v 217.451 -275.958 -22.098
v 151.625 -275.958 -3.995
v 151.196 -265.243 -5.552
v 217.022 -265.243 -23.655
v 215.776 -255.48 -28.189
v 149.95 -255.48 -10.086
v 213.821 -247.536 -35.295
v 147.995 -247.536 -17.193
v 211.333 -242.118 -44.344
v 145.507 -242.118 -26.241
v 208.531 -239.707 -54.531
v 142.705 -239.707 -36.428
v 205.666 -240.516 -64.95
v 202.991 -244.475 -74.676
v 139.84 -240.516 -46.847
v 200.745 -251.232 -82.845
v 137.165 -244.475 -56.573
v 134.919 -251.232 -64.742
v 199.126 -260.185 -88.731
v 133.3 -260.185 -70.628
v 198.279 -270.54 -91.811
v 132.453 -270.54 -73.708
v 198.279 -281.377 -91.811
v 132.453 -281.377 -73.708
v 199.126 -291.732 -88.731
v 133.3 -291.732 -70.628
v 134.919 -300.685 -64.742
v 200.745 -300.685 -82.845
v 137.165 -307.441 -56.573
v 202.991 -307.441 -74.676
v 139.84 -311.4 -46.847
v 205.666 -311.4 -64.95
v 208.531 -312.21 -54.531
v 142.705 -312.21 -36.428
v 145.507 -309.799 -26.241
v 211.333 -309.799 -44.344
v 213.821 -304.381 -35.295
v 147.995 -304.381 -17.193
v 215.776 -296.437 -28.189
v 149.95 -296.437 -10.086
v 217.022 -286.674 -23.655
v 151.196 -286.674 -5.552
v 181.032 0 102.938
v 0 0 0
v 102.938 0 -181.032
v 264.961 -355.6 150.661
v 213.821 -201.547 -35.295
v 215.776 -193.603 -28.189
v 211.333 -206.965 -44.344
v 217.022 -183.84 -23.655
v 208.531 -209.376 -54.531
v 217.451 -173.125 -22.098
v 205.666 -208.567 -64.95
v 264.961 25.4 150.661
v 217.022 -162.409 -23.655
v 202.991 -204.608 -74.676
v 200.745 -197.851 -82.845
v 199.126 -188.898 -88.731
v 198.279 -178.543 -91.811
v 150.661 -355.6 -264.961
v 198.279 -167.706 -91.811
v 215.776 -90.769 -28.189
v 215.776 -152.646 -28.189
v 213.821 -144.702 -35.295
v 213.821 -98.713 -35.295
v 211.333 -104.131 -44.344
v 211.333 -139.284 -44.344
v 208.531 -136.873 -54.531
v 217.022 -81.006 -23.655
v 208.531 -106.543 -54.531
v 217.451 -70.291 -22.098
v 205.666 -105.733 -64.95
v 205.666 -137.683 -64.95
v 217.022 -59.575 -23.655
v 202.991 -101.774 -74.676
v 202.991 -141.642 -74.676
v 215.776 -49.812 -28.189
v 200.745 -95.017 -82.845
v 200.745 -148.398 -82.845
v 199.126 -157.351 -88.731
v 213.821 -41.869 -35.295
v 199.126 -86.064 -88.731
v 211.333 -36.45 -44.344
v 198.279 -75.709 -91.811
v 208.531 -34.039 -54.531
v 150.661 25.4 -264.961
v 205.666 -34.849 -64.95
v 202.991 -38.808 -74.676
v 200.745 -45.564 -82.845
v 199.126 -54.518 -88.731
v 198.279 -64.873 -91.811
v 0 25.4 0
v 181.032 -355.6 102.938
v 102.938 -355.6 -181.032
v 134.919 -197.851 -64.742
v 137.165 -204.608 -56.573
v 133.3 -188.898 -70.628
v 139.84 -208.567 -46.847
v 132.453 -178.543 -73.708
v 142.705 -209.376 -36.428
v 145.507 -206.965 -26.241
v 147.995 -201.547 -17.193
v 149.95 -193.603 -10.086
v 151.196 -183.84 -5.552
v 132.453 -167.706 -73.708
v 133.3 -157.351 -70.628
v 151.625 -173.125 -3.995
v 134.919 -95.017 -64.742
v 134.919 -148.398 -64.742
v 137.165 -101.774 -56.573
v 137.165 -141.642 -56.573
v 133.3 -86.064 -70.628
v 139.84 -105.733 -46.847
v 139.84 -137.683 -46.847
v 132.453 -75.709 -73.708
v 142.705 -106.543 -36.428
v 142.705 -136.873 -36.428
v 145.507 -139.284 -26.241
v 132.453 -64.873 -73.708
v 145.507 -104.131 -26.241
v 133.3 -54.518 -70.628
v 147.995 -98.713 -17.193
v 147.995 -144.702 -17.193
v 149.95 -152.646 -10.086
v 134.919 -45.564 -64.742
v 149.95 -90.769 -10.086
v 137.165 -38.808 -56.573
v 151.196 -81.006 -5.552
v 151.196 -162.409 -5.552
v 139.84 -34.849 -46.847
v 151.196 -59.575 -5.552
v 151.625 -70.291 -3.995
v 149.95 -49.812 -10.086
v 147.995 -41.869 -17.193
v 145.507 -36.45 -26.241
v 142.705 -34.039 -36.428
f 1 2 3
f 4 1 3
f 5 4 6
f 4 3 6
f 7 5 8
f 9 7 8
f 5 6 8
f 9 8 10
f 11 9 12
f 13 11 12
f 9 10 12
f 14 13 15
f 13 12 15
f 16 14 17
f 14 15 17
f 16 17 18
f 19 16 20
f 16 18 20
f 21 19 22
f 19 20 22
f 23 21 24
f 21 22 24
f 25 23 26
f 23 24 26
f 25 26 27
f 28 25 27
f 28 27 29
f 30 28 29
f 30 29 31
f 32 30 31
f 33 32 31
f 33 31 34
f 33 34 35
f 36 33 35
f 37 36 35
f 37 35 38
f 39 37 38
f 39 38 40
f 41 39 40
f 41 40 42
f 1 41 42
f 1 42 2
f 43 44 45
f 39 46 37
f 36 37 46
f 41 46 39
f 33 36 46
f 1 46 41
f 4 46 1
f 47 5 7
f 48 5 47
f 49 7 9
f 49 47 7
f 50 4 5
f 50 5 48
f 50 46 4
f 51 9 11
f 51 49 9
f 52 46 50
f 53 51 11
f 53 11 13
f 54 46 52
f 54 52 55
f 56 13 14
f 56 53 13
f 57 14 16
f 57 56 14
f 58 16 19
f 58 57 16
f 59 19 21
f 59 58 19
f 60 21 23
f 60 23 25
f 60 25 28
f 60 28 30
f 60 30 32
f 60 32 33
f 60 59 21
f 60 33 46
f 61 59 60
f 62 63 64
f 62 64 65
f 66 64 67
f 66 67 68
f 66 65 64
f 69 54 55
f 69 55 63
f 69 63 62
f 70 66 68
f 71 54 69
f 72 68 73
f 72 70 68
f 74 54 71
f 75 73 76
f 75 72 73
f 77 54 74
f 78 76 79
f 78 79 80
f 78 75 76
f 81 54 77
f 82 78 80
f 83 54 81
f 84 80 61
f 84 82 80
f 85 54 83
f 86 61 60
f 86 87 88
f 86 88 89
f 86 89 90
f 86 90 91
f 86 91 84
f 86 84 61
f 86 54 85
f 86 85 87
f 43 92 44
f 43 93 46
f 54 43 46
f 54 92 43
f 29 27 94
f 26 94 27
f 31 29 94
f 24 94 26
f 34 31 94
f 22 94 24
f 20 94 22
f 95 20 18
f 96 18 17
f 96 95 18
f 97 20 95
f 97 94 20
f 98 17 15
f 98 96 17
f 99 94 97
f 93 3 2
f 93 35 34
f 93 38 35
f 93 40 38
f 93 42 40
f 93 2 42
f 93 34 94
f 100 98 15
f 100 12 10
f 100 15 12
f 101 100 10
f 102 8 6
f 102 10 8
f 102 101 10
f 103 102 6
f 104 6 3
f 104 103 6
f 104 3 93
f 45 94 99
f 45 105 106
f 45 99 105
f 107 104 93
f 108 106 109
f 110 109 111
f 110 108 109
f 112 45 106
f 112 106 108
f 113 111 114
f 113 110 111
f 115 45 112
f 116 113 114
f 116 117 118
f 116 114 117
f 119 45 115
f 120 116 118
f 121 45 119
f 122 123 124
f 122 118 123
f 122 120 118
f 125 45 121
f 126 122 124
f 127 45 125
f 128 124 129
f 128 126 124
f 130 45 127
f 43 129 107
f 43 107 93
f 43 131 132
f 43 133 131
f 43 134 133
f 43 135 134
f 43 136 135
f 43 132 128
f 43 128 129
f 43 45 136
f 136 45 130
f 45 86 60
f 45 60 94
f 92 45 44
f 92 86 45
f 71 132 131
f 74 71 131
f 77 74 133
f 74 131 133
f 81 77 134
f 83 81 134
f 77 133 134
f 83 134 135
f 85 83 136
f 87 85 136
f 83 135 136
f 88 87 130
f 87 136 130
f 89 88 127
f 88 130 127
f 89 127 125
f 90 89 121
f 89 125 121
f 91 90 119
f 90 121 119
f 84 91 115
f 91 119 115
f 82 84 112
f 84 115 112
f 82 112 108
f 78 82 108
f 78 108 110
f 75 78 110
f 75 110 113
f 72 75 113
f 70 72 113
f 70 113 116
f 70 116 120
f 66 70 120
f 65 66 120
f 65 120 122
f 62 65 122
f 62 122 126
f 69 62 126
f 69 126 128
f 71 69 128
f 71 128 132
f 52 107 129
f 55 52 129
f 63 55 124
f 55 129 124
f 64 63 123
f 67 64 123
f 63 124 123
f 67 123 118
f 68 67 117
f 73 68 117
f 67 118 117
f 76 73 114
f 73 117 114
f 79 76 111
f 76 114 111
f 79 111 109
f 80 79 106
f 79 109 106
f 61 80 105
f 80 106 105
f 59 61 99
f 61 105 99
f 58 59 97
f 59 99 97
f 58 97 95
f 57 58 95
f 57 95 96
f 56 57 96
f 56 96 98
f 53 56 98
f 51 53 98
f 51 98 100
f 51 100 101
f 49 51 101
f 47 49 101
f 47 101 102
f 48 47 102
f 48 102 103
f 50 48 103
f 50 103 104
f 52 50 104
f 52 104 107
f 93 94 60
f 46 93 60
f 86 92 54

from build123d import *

# Parameters (mm, degrees)
BOSS_EXTRUDE1_DEPTH = 25.4
BOSS_EXTRUDE2_DEPTH = 381
SKETCH3_R           = 36.353481393
CUT_EXTRUDE1_DEPTH  = 381


with BuildPart() as part:
    # Sketch1 → Boss-Extrude1 (new body)
    with BuildSketch(Plane(origin=(0, 0, 0), x_dir=(1, 0, 0), z_dir=(0, 1, 0))):
        Polygon((0, 0), (264.960965784, -150.660965784), (150.660965784, 264.960965784), align=None)
    extrude(amount=BOSS_EXTRUDE1_DEPTH)

    # Sketch2 → Boss-Extrude2 (add)
    with BuildSketch(Plane(origin=(0, 25.4, 0), x_dir=(1, 0, 0), z_dir=(0, 1, 0))):
        Polygon((150.660965784, 264.960965784), (102.937728624, 181.032159524), (181.032159524, -102.937728624), (264.960965784, -150.660965784), align=None)
    extrude(amount=-BOSS_EXTRUDE2_DEPTH)

    # Sketch3 → Cut-Extrude1 (cut)
    with BuildSketch(Plane(origin=(141.984944074, 0, -39.04721545), x_dir=(0.26516504294494564, 0, 0.9642030387838472), z_dir=(-0.9642030387838472, 0, 0.26516504294494564))):
        with Locations((0, -70.290841781)):
            Circle(SKETCH3_R)
        with Locations((0, -173.124599598)):
            Circle(SKETCH3_R)
        with Locations((0, -275.958357416)):
            Circle(SKETCH3_R)
    extrude(amount=-CUT_EXTRUDE1_DEPTH, mode=Mode.SUBTRACT)


solid = part.part
